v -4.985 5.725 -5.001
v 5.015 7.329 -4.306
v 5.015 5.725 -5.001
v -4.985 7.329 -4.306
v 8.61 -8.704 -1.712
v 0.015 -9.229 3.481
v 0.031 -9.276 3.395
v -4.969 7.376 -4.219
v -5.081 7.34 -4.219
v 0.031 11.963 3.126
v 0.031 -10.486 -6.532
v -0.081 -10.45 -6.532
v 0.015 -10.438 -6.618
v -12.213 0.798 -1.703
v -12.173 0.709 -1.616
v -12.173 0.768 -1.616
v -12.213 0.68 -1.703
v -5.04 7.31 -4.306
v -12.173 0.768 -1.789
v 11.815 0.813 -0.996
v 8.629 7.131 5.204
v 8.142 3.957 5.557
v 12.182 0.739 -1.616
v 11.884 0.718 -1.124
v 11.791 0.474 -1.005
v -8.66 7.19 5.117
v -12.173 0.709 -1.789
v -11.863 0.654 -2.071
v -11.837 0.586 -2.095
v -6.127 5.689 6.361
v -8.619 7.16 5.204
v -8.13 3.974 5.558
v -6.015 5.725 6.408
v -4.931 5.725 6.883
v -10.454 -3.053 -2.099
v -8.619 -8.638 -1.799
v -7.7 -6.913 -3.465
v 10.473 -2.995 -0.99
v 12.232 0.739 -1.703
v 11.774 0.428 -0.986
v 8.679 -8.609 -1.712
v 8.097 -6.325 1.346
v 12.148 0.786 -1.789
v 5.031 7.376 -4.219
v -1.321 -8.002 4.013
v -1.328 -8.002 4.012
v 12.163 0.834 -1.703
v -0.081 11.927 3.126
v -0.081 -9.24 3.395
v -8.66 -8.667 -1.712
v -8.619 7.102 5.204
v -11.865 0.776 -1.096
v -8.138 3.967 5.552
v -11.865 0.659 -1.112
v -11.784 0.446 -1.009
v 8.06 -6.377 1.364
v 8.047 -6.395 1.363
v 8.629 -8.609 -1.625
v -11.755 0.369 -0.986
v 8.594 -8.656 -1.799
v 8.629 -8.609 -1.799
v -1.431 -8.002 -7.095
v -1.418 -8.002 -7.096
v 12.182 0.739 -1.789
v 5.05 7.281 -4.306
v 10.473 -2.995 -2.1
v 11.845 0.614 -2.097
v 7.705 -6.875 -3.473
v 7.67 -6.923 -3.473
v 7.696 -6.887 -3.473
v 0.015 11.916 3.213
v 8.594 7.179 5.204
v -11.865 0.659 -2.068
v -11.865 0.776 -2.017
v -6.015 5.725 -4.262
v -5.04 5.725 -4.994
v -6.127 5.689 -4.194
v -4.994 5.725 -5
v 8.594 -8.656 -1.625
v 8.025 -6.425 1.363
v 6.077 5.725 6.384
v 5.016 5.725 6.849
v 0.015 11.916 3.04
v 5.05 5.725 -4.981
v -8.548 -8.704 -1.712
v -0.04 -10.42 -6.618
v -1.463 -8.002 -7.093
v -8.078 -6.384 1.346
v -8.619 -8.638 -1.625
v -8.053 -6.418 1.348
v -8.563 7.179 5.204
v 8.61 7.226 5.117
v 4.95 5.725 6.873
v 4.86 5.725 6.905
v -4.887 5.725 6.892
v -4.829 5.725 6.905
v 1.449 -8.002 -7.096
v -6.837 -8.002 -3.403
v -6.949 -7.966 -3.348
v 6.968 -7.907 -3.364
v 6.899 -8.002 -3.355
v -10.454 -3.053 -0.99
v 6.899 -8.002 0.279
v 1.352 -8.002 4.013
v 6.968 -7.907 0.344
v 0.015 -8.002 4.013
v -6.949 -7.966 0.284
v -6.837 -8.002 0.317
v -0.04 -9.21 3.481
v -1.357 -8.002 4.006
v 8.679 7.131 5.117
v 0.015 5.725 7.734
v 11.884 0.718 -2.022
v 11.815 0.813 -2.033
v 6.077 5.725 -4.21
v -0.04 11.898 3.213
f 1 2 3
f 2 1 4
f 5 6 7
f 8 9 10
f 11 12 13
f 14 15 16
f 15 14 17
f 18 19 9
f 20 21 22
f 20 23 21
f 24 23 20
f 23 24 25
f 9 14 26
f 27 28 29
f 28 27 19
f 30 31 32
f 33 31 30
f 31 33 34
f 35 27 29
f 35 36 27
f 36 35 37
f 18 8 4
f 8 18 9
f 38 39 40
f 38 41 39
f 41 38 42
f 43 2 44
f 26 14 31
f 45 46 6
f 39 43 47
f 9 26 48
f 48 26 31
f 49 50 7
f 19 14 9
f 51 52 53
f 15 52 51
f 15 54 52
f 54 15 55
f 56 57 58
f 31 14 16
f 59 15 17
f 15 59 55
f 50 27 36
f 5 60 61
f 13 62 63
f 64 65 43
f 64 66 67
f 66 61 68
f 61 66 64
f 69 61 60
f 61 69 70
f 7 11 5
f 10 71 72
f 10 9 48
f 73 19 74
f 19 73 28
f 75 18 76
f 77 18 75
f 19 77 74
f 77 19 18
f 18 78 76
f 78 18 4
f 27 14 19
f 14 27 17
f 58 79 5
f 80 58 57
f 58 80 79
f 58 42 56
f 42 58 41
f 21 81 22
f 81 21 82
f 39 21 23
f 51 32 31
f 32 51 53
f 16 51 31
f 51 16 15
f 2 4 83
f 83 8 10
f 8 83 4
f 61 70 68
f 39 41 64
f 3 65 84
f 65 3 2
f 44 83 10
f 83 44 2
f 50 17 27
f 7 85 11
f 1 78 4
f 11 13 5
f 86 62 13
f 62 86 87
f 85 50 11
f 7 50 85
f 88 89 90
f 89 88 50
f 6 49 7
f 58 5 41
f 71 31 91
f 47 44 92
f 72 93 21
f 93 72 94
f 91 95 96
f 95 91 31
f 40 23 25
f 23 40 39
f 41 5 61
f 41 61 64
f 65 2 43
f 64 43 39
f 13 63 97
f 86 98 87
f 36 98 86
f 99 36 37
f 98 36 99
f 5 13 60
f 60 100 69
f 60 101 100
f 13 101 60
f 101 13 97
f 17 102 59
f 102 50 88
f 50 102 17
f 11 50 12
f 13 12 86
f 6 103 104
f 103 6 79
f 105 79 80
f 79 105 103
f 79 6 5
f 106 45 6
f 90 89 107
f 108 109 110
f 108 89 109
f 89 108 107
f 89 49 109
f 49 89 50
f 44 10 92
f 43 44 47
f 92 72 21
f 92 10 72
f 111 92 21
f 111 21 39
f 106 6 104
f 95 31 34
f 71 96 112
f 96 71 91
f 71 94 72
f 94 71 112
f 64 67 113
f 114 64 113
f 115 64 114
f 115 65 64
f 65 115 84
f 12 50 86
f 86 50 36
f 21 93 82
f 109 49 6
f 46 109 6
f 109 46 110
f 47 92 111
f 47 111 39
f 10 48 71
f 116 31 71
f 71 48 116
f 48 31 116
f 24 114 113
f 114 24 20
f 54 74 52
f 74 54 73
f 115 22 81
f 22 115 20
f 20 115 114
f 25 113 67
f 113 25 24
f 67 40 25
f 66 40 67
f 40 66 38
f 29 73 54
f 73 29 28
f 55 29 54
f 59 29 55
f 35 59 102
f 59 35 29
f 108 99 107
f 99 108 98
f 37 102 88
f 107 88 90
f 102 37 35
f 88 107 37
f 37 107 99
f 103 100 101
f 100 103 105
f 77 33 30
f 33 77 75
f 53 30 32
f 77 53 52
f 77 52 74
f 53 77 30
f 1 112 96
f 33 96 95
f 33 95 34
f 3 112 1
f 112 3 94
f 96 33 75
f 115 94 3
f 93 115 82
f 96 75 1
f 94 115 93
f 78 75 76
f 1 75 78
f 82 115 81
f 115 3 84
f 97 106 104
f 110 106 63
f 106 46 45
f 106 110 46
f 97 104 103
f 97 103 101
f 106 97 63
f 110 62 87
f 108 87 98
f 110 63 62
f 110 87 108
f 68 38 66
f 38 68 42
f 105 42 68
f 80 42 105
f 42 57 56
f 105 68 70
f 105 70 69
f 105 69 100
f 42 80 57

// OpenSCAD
// Auto-generated OpenSCAD file

    inner_points = 10*[[-0.2885376862918134, 0.07175899174657377, -1.1783945441115085], [0.28853768640082145, 0.07175900040332306, 1.1783945428274933], [-1.1783945434149965, 0.0717589960423746, 0.28853768570430977], [1.1783945435240049, 0.07175899610752223, -0.28853768698832505], [-1.037277726864703, -0.29945504957306746, -0.6292238173151442], [0.6292238183363167, -0.2994550495270012, -1.0372777266018605], [-0.6292238175779867, -0.29945504345182133, 1.0372777278858758], [1.037277727623033, -0.299455043405755, 0.6292238185991594], [-0.16817179443109592, -0.7907165367613447, -0.6868174750759801], [0.16817179604873278, -0.7907165317158302, 0.6868174797585049], [-0.686817476608424, -0.7907165342575728, 0.16817179758117676], [0.6868174782260609, -0.7907165342196021, -0.16817179289865195], [-0.6045687129127788, 0.5630204820268412, -0.366737881241974], [0.36673787852556217, 0.5630204820536906, -0.604568714878892], [-0.366737879275861, 0.5630204855945586, 0.6045687101963672], [0.6045687121624802, 0.563020485621408, 0.3667378765594492]];

    outer_points = 10*[[-1.213205545812953, 0.07387883237032282, -0.17027003437574006], [1.2132055459196738, 0.07387883237032282, -0.17027003361533383], [-9.797521174090613e-11, 1.186835379548445, 0.3126330832175659], [2.0469611576138433e-10, -1.0390777148077994, -0.6531731512086397], [-0.8578658686155681, 0.7131002893052931, 0.5117341025641999], [-0.8578658684015472, -0.8608579540459387, -0.17119403511081444], [0.8578658682948263, 0.7131002893052931, 0.5117341031018883], [0.8578658685088472, -0.8608579540459387, -0.17119403457312604], [-0.7071067813811416, -0.2694200616443975, 0.6209378460253994], [0.7071067809919536, -0.2694200616443975, 0.6209378464685957], [-2.827987185956705e-10, 0.3792574228569266, 0.9023939193757089], [-1.0638924793604034e-10, -0.9180975461457217, 0.33948177311828626], [-0.49999999986777616, 0.7281043097383153, -0.42191834848824256], [-0.49999999974303583, -0.1892641864495203, -0.8199573443191398], [0.5000000001322238, 0.7281043097383153, -0.42191834817485535], [0.5000000002569641, -0.1892641864495203, -0.8199573440057525]];

    // Convex hull for inner set (I)
    module inner_hull() {
        hull() {
            for (p = inner_points) {
                translate(p) sphere(r=0.1);
            }
        }
    }

    // Convex hull for outer set (O) minus inner hull (O \ I)
    module outer_minus_inner() {
        difference() {
            hull() {
                for (p = outer_points) {
                    translate(p) sphere(r=0.1);
                }
            }
            inner_hull(); // Subtract inner hull
        }
    }

    // Convex hull for outer set (O) minus all translated inner hulls
    module outer_minus_AllTranslationInner() {
        difference() {
            hull() {
                for (p = outer_points) {
                    translate(p) sphere(r=0.1);
                }
            }
            hull() {
                translate([0,0,50]) inner_hull();
                translate([0,0,-50]) inner_hull();
            }; // Subtract translated inner hulls
        }
    }

    // Difference between outer_minus_inner and outer_minus_AllTranslationInner
    module outer_minus_inner_diff() {
        difference() {
            // Outer minus inner
            difference() {
                hull() {
                    for (p = outer_points) {
                        translate(p) sphere(r=0.1);
                    }
                }
                inner_hull();
            }

            // Subtract Outer minus AllTranslationInner
            difference() {
                hull() {
                    for (p = outer_points) {
                        translate(p) sphere(r=0.1);
                    }
                }
                hull() {
                    translate([0,0,50]) inner_hull();
                    translate([0,0,-50]) inner_hull();
                };
            }
        }
    }

    // Rendering all with colors applied
    color([0, 1, 0, 1]) outer_minus_AllTranslationInner(); // Opaque green
    
